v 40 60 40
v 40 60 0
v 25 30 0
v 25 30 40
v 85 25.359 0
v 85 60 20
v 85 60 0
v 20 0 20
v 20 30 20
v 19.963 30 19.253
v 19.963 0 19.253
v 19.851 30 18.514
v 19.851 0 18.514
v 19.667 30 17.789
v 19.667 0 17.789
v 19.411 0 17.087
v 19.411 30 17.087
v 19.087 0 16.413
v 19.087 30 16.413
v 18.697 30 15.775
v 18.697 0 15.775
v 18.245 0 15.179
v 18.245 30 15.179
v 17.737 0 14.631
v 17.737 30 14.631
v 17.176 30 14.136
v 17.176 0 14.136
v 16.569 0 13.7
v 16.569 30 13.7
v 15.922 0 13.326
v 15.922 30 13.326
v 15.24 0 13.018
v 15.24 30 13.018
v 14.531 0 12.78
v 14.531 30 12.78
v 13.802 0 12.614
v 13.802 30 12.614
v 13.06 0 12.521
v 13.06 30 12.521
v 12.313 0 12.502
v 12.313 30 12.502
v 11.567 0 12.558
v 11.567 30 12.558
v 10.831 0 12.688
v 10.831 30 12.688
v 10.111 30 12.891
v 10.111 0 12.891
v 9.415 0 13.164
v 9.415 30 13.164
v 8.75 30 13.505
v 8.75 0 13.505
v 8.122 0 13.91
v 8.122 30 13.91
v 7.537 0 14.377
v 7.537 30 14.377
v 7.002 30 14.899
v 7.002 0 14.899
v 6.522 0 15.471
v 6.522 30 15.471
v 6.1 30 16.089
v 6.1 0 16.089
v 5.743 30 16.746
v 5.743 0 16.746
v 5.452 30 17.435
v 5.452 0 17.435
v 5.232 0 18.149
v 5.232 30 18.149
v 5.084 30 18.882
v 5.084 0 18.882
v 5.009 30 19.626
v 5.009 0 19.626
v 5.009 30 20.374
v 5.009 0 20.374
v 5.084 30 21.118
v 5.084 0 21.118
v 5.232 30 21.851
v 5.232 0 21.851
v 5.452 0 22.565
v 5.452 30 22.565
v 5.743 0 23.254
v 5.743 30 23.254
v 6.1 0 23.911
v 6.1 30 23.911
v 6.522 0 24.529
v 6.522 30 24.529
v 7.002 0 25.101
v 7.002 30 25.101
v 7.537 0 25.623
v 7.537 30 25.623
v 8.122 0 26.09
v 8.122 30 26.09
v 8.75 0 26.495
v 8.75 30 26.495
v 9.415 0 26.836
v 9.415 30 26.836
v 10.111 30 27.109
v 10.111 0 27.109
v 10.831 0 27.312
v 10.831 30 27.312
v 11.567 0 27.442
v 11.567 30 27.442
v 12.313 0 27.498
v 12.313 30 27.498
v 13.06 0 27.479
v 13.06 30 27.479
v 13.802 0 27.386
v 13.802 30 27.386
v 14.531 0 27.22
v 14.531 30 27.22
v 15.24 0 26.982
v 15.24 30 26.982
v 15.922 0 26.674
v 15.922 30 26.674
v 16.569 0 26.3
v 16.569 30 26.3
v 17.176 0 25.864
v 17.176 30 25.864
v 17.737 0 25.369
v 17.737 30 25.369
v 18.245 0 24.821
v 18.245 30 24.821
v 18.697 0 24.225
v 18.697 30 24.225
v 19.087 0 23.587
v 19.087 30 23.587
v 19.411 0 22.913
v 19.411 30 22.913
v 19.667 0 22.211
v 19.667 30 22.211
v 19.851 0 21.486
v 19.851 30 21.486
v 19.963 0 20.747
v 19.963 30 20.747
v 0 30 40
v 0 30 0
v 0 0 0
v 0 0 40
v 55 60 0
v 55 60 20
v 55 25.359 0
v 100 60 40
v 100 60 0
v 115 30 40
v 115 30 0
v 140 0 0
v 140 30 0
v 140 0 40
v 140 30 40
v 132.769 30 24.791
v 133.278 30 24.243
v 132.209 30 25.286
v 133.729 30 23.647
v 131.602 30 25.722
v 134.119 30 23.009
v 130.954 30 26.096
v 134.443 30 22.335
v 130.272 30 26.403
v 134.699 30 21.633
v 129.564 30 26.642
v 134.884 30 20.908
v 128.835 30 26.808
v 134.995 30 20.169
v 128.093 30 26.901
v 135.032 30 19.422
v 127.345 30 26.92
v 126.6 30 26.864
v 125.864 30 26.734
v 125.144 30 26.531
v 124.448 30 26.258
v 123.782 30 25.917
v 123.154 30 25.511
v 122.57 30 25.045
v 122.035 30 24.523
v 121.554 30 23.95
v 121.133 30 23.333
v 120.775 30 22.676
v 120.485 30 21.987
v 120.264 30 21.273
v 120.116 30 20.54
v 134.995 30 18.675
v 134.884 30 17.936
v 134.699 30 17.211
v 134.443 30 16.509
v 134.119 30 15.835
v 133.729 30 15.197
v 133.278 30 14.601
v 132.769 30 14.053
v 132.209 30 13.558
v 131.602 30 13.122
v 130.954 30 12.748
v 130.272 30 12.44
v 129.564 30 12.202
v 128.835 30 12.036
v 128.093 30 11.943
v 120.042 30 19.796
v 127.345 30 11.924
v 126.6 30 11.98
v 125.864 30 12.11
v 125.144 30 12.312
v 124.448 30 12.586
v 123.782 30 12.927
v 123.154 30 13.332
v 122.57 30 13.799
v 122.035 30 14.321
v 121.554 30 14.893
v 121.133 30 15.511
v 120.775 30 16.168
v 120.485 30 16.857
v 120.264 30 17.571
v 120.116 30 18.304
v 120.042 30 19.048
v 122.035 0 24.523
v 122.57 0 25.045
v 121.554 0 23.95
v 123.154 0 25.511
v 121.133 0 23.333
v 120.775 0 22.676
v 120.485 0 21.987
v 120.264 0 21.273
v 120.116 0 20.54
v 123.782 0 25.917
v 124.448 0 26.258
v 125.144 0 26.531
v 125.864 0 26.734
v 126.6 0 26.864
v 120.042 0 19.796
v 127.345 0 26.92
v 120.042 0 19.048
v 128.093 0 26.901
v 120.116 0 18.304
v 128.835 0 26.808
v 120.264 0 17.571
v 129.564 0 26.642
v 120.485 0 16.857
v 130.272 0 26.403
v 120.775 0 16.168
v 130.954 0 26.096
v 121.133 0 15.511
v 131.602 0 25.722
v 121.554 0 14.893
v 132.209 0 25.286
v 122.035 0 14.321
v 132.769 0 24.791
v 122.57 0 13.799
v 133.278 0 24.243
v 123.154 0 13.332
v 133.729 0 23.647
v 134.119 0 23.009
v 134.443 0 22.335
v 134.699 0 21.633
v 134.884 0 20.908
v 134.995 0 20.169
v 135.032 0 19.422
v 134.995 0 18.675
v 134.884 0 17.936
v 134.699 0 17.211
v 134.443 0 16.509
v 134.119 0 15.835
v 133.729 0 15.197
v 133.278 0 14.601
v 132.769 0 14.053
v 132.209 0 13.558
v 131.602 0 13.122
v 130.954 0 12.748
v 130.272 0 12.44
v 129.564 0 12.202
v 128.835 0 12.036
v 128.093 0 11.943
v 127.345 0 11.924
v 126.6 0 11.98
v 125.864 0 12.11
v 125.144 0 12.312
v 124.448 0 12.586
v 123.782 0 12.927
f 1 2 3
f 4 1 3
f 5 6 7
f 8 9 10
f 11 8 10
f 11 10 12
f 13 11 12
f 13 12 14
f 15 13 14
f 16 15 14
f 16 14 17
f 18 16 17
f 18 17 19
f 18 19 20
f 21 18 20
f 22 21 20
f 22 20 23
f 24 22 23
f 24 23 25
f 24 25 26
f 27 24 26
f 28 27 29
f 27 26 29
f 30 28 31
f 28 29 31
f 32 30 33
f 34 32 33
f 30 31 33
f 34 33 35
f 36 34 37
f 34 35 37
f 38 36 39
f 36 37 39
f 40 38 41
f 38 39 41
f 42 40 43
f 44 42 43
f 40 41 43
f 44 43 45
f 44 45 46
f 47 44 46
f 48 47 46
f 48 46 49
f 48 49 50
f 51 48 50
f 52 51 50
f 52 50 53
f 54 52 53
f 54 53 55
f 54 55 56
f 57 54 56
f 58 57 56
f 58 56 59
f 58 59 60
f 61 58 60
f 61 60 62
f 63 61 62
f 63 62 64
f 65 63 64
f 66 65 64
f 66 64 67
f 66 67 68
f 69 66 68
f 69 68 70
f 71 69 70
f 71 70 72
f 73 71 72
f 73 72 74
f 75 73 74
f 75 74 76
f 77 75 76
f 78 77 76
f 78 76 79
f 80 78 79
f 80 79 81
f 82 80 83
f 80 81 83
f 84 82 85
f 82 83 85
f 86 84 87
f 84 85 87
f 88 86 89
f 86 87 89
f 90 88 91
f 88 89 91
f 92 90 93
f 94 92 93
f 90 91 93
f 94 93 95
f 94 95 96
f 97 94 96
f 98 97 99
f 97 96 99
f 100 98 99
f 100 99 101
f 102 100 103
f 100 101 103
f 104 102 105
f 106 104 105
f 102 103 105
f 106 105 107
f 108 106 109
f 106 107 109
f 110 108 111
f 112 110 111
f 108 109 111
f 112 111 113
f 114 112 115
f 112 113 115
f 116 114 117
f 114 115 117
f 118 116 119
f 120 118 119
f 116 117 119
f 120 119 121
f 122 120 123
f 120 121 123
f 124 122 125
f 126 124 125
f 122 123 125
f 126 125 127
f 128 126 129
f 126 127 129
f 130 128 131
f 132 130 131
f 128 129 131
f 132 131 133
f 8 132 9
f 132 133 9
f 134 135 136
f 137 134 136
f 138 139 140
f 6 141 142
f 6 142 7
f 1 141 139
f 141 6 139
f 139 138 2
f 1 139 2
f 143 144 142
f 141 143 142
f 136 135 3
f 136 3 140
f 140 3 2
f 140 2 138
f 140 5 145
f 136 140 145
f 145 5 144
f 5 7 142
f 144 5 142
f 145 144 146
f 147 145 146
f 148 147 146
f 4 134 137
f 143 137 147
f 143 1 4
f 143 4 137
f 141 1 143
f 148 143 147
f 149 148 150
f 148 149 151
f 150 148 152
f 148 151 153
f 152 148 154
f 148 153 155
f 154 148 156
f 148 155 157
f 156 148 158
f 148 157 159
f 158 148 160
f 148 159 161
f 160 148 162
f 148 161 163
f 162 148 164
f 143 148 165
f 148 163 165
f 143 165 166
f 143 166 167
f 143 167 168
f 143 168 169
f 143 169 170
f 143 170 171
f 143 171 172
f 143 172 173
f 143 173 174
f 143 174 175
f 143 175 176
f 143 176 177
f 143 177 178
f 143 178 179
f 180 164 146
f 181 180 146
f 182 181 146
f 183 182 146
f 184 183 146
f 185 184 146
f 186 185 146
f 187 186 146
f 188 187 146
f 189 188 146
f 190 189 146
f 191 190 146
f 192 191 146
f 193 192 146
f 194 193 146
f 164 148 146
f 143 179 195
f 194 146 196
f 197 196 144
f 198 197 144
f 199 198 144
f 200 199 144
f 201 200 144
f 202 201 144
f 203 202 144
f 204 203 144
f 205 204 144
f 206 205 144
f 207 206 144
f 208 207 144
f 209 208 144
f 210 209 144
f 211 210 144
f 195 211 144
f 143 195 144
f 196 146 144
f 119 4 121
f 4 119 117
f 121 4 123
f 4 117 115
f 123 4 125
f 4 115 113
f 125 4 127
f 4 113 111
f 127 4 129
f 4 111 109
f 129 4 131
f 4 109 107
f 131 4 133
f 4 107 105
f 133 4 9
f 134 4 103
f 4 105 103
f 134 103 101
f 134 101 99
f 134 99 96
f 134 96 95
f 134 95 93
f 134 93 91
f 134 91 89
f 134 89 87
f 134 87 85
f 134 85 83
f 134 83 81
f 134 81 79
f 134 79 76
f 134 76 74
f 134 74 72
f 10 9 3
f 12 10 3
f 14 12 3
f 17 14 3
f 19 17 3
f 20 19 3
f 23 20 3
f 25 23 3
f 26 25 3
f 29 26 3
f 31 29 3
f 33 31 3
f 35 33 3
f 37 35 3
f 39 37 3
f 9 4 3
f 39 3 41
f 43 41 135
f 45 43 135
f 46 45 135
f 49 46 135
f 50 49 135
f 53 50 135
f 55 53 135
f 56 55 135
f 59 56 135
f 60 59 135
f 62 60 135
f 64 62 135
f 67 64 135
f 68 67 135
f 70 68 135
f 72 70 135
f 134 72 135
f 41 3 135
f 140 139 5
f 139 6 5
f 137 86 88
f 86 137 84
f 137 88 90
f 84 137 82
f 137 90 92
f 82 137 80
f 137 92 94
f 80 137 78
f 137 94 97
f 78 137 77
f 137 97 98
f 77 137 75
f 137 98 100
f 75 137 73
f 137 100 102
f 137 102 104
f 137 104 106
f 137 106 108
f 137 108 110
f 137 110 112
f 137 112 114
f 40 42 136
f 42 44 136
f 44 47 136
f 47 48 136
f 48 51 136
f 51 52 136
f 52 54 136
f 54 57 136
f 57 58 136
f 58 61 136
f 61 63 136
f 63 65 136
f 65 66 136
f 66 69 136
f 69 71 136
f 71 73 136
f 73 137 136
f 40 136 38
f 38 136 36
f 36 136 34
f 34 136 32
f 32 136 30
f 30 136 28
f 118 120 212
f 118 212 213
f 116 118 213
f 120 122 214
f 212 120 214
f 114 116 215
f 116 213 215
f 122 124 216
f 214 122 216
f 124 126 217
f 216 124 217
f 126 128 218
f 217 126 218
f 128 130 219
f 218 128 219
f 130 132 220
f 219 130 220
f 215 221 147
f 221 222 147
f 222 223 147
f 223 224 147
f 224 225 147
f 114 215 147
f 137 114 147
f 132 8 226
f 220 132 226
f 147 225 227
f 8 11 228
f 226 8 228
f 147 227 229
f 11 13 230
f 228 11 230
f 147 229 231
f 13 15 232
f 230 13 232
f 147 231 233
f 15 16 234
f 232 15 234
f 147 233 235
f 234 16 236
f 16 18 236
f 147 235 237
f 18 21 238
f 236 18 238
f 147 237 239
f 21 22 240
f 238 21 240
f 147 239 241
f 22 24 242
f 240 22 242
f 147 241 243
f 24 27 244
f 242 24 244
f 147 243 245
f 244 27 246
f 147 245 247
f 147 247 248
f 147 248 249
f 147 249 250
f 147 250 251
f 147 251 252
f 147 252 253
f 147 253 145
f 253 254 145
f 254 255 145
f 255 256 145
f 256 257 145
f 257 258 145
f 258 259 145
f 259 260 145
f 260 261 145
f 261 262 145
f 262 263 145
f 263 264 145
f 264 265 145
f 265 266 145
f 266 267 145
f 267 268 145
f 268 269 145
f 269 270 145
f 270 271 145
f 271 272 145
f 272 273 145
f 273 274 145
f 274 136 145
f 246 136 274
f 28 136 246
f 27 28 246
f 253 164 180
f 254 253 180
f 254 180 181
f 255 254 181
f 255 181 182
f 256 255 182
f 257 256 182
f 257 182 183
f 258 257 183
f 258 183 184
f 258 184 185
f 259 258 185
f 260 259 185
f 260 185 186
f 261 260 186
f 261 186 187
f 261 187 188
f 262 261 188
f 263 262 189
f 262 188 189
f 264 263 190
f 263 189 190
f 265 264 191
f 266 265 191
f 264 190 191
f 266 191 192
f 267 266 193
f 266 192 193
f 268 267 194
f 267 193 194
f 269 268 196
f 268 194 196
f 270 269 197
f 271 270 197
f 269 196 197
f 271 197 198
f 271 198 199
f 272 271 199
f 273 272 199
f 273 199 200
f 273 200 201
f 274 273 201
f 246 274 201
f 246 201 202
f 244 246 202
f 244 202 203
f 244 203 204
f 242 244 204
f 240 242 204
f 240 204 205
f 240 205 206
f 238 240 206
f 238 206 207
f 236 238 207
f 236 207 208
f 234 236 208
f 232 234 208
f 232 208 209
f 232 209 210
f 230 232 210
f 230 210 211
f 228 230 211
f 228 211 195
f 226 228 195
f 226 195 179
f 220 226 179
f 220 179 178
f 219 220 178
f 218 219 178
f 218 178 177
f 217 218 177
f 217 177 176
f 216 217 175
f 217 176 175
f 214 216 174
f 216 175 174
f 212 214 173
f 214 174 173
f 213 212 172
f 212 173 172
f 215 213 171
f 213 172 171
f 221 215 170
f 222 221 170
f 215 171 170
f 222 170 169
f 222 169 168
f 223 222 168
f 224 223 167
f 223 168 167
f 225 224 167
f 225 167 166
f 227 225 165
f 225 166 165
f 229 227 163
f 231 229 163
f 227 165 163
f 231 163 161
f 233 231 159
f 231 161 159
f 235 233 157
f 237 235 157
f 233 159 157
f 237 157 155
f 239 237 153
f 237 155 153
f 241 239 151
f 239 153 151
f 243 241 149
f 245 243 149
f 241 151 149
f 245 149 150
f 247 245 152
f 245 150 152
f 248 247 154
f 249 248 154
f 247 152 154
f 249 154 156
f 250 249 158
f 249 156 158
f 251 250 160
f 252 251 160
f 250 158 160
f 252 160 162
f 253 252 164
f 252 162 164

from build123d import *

# Parameters (mm, degrees)
SALIENTE_EXTRUIR1_DEPTH    = 40
CROQUIS2_R                 = 7.5
CORTAR_EXTRUIR1_DEPTH      = 40
CROQUIS3_R                 = 7.5
CORTAR_EXTRUIR2_DEPTH      = 40
CORTAR_EXTRUIR4_DEPTH      = 15
CORTAR_EXTRUIR4_DEPTH_BACK = 15


with BuildPart() as part:
    # Croquis1 → Saliente-Extruir1 (new body)
    with BuildSketch(Plane.XY):
        Polygon((0, 0), (140, 0), (140, 30), (115, 30), (100, 60), (40, 60), (25, 30), (0, 30), align=None)
    extrude(amount=SALIENTE_EXTRUIR1_DEPTH)

    # Croquis2 → Cortar-Extruir1 (cut)
    with BuildSketch(Plane(origin=(0, 30, 0), x_dir=(1, 0, 0), z_dir=(0, 1, 0))):
        with Locations((127.532427411, -19.421880323)):
            Circle(CROQUIS2_R)
    extrude(amount=-CORTAR_EXTRUIR1_DEPTH, mode=Mode.SUBTRACT)

    # Croquis3 → Cortar-Extruir2 (cut)
    with BuildSketch(Plane(origin=(0, 30, 0), x_dir=(1, 0, 0), z_dir=(0, 1, 0))):
        with Locations((12.5, -20)):
            Circle(CROQUIS3_R)
    extrude(amount=-CORTAR_EXTRUIR2_DEPTH, mode=Mode.SUBTRACT)

    # Croquis16 → Cortar-Extruir4 (cut, two sides)
    with BuildSketch(Plane(origin=(70, 0, 0), x_dir=(0, 0, -1), z_dir=(1, 0, 0))) as cortar_extruir4_sk:
        Polygon((0, 60), (-20, 60), (0, 25.358983849), align=None)
    extrude(amount=CORTAR_EXTRUIR4_DEPTH, mode=Mode.SUBTRACT)
    extrude(cortar_extruir4_sk.sketch, amount=-CORTAR_EXTRUIR4_DEPTH_BACK, mode=Mode.SUBTRACT)


solid = part.part
